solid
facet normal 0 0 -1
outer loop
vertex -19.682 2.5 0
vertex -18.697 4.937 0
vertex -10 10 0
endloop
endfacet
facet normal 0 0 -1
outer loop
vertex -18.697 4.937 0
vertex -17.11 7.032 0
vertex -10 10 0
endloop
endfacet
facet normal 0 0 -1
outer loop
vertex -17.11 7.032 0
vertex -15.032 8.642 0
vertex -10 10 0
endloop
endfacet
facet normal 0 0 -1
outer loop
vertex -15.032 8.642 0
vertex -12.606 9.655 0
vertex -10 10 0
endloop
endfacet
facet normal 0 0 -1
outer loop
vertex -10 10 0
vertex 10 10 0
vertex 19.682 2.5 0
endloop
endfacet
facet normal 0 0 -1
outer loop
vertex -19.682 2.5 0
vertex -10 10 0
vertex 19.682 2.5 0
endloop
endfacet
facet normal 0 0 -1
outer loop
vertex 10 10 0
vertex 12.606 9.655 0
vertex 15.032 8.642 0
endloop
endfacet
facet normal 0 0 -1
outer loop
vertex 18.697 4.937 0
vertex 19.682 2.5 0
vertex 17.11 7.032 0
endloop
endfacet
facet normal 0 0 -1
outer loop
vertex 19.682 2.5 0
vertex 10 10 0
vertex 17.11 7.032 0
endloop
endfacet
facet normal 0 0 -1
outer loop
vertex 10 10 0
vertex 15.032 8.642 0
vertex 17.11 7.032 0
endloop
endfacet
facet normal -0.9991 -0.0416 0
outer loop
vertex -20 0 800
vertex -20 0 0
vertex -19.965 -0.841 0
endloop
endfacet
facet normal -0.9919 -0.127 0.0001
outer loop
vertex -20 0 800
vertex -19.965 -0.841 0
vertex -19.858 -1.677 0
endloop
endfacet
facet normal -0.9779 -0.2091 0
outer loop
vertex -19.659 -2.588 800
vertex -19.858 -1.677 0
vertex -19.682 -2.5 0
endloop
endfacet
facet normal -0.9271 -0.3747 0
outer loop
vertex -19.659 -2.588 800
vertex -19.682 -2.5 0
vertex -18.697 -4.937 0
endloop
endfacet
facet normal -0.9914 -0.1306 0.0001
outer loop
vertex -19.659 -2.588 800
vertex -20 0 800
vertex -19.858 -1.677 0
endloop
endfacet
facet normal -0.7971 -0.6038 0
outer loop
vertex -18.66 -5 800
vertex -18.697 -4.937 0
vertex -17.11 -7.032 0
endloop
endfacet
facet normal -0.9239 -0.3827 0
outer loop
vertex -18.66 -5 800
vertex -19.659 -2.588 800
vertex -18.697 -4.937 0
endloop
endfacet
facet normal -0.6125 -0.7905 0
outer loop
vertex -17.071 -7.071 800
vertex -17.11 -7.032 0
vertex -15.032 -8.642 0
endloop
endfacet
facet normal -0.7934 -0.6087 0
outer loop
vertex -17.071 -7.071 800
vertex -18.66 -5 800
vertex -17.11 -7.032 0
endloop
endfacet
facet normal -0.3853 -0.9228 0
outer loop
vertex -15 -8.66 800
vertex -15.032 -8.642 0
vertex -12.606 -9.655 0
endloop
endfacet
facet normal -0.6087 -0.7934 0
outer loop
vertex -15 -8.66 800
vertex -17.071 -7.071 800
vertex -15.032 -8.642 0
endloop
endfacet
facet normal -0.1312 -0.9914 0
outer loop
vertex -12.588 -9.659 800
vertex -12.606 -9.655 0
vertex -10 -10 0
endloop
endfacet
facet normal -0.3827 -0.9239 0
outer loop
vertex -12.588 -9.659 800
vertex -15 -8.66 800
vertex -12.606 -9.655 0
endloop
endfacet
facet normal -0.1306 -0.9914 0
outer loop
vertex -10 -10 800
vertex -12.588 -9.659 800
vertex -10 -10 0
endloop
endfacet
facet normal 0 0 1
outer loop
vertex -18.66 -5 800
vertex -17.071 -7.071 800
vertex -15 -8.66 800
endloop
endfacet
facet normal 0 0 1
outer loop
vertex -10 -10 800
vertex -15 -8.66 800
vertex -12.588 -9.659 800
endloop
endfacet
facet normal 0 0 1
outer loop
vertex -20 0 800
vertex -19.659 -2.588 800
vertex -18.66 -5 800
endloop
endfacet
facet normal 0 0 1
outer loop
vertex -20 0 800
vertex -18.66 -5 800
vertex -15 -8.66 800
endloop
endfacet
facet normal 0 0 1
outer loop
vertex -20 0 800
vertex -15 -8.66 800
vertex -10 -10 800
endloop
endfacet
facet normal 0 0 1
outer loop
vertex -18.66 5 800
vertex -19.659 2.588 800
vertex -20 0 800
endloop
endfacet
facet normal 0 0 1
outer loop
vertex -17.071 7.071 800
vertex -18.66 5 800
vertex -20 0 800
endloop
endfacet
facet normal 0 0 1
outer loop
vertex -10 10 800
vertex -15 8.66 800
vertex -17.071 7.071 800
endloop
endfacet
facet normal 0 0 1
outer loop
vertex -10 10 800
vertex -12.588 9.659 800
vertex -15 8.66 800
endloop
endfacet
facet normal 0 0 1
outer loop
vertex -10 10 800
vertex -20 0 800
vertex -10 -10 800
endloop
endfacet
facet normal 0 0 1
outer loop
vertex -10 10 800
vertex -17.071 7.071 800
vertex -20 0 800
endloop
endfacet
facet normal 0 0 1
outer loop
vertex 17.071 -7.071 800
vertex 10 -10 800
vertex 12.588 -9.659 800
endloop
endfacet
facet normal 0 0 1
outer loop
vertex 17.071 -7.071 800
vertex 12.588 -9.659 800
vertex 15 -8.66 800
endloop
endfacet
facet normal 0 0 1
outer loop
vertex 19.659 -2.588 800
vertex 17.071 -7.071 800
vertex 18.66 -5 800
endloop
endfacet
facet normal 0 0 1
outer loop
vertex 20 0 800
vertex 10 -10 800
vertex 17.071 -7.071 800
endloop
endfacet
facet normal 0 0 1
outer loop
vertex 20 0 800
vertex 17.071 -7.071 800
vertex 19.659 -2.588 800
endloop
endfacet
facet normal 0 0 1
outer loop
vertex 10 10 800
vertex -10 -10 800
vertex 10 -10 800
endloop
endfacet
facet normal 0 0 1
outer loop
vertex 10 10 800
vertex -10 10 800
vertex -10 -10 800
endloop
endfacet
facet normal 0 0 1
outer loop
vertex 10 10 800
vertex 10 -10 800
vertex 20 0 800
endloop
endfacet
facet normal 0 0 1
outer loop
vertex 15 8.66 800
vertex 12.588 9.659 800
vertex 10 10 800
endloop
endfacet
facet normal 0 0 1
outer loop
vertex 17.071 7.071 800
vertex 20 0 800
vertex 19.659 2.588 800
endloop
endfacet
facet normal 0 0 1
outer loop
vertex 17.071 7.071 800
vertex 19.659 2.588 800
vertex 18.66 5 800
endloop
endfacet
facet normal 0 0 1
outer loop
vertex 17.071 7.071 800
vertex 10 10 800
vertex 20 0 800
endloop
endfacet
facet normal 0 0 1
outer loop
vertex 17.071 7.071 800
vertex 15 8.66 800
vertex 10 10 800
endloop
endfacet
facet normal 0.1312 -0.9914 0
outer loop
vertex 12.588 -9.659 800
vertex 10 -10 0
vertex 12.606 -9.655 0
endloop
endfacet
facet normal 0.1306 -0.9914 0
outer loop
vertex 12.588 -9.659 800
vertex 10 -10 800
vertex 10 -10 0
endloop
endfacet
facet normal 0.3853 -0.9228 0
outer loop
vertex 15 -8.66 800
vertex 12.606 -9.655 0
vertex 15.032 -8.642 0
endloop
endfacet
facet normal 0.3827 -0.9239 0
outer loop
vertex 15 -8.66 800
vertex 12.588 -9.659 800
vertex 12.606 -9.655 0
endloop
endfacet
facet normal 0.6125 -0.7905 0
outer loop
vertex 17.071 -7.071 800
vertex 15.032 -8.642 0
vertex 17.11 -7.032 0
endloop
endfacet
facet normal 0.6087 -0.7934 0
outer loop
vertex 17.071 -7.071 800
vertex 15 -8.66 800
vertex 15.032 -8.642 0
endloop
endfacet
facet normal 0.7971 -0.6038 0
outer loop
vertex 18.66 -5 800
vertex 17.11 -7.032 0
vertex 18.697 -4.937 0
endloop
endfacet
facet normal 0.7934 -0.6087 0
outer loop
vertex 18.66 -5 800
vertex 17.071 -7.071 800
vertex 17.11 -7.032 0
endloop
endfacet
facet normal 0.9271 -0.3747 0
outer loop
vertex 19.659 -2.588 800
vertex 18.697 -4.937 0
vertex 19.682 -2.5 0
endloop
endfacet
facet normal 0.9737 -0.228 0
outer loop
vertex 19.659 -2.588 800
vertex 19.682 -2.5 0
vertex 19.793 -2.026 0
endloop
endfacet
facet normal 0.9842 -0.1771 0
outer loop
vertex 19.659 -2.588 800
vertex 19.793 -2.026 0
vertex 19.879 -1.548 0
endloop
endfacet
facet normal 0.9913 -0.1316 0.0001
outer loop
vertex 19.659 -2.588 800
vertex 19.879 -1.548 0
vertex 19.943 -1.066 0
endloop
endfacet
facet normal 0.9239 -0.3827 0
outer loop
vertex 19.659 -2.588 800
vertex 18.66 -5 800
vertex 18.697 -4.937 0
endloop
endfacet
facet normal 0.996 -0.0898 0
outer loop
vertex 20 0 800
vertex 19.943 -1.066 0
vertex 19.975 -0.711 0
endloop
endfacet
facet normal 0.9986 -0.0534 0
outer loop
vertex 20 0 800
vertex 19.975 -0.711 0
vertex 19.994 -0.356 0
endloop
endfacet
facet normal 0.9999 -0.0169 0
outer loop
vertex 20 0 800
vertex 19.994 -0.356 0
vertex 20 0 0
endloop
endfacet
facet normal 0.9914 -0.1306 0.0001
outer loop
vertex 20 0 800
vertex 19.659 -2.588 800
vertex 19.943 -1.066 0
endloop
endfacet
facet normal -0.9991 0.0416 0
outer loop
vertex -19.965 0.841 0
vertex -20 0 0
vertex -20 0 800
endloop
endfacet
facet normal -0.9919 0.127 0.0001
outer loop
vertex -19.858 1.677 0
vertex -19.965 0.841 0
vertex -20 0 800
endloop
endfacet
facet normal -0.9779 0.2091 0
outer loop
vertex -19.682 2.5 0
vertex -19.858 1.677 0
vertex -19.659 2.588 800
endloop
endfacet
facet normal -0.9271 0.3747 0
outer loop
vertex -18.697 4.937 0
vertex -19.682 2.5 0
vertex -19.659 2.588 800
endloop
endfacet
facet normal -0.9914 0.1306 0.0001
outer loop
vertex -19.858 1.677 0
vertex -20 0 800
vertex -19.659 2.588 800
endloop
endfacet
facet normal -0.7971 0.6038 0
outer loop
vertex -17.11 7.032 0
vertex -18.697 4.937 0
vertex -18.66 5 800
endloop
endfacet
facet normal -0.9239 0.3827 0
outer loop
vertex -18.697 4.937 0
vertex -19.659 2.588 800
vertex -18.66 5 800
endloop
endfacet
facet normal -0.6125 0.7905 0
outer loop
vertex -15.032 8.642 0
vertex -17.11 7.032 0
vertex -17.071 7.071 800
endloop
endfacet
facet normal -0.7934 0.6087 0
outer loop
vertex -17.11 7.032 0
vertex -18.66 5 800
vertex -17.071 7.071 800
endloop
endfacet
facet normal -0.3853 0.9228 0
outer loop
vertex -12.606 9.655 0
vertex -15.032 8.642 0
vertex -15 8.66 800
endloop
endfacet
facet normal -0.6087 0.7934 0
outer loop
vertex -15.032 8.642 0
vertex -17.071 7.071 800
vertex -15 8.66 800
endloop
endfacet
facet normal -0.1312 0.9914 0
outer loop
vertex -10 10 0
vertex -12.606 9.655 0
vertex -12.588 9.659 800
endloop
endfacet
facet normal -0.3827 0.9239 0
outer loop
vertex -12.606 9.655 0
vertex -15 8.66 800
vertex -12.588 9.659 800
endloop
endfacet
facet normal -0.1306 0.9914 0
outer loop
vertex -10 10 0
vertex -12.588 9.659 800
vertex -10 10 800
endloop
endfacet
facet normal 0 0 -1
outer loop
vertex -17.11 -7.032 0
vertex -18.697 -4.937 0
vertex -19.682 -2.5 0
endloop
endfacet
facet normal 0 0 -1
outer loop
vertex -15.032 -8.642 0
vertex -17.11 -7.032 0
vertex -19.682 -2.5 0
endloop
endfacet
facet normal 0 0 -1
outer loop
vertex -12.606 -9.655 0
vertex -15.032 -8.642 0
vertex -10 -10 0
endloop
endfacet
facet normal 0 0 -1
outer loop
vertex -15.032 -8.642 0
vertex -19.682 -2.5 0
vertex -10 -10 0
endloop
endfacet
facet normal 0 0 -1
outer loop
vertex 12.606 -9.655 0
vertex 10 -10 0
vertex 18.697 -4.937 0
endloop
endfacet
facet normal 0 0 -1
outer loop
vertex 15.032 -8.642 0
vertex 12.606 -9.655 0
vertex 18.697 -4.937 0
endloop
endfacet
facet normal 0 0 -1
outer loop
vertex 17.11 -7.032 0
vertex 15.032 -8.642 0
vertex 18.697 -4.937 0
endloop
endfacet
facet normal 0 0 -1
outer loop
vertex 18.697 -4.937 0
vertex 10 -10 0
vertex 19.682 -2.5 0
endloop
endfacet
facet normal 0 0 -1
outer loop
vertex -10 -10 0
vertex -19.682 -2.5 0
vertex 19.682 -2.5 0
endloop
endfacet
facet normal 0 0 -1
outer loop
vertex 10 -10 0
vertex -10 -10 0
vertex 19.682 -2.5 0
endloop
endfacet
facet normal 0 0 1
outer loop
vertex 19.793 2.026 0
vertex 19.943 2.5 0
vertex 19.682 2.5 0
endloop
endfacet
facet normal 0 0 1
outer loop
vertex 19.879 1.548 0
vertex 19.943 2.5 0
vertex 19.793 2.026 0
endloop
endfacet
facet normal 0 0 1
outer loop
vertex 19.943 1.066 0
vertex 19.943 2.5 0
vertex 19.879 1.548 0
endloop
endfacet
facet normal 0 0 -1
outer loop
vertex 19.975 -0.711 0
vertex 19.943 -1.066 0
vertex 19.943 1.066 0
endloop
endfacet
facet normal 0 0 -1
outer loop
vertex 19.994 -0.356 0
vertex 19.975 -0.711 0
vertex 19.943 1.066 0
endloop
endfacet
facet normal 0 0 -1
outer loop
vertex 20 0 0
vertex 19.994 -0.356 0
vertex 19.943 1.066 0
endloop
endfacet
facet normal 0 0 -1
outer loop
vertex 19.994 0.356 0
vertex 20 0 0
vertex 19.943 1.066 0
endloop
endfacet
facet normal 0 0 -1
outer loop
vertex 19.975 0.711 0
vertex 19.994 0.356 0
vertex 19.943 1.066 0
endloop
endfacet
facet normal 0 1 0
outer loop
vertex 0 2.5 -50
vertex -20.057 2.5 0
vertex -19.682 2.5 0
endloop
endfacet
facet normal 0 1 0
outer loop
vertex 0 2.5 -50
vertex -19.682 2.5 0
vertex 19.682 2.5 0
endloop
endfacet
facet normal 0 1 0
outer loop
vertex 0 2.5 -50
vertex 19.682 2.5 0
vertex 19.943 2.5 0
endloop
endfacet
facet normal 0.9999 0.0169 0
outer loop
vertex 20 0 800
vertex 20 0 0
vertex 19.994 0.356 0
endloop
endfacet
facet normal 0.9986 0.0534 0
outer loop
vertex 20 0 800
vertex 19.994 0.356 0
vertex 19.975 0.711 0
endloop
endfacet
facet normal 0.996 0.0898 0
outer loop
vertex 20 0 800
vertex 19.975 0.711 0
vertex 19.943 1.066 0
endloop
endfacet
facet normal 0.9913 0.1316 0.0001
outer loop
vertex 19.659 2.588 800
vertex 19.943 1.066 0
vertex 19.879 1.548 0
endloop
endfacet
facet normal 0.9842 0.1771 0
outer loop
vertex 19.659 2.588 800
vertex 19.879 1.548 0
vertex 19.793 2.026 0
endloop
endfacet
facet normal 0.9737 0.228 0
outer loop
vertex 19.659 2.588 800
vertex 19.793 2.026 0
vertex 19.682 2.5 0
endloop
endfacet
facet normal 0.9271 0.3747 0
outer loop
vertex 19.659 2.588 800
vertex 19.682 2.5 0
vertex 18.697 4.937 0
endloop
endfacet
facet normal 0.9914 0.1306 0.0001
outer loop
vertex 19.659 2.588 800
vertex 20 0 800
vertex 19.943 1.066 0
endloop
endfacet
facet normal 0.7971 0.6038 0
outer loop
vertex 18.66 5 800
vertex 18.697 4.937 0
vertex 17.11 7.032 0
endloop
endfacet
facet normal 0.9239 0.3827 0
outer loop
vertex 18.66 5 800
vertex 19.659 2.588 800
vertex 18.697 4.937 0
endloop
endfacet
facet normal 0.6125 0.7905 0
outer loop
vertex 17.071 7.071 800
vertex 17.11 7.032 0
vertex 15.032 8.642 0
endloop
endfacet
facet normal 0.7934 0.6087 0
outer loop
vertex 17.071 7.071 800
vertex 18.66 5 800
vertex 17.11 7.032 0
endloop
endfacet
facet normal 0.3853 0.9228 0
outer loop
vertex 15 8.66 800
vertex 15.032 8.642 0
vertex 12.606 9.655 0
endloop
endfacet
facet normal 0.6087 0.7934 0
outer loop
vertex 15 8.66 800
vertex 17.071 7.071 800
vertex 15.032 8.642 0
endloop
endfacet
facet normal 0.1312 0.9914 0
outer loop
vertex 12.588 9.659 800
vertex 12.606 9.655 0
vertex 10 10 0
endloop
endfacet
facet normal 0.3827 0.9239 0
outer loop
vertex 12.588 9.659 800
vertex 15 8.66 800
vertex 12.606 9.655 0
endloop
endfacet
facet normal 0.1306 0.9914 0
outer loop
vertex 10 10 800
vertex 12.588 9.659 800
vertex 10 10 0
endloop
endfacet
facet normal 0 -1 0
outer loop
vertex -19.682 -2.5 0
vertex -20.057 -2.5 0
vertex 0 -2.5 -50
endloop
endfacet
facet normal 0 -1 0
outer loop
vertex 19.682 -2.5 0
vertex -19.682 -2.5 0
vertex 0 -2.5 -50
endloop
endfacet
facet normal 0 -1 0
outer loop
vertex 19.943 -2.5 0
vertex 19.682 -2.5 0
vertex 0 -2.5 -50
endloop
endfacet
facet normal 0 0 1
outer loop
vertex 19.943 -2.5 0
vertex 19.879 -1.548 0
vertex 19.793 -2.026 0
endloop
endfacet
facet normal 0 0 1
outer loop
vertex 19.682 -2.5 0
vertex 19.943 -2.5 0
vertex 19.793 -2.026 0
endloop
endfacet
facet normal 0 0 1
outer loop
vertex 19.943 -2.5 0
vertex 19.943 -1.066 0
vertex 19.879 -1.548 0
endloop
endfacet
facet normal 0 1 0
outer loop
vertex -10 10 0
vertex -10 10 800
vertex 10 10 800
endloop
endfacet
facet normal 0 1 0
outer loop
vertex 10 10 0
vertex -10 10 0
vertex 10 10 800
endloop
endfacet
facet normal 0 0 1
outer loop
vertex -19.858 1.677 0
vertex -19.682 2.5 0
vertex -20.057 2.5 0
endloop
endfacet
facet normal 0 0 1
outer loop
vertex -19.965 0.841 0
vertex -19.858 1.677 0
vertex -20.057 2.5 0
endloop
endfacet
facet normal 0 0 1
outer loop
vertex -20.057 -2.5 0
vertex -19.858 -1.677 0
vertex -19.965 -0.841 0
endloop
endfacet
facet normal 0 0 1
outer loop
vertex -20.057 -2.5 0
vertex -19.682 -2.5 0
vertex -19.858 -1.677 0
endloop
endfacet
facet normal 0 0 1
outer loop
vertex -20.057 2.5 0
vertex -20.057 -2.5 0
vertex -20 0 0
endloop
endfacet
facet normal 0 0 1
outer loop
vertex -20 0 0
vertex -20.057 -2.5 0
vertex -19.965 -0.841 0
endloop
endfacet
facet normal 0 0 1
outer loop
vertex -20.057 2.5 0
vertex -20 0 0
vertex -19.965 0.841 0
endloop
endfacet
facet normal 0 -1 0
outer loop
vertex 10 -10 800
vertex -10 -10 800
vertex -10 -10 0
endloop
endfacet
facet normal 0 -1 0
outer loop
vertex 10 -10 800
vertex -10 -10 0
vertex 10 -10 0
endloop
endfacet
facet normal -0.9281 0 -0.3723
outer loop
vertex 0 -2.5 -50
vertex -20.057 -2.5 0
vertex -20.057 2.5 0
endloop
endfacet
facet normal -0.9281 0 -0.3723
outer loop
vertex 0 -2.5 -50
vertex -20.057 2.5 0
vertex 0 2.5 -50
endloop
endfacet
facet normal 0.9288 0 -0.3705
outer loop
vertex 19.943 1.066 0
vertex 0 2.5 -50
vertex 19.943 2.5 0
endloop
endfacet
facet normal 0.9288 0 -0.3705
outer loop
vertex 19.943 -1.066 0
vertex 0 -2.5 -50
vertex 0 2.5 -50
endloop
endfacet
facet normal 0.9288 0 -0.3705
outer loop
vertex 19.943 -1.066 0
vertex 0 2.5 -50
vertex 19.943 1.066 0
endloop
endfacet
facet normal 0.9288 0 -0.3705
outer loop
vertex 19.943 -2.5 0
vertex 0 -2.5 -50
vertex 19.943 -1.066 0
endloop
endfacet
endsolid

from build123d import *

# Parameters (mm, degrees)
F0_W     = 40
F0_H     = 20
F1_DEPTH = 800
F2_R     = 9.99999
F4_DEPTH = 2.5


# Not quite as in the source:
# - a fillet or chamfer is up to 0.001 mm smaller than in the source, because OpenCascade refuses the exact size


with BuildPart() as f1:
    # F0 (on Top) → F1 (new body)
    with BuildSketch(Plane.XY):
        Rectangle(F0_W, F0_H)
    extrude(amount=F1_DEPTH)

    # F2 (radius 10 in the source; OpenCascade refuses exactly that, so slightly less here)
    f2_edges = [f1.edges().sort_by_distance(p)[0] for p in [
        (20, -10, 400),
        (20, 10, 400),
        (-20, -10, 400),
        (-20, 10, 400),
    ]]
    fillet(f2_edges, radius=F2_R)

    # F3 (on Front) → F4 (join, symmetric)
    with BuildSketch(Plane.XZ):
        Polygon((19.9430335092, 0), (-20.0569664908, 0), (0, -50), align=None)
    extrude(amount=F4_DEPTH, both=True)


solid = f1.part
